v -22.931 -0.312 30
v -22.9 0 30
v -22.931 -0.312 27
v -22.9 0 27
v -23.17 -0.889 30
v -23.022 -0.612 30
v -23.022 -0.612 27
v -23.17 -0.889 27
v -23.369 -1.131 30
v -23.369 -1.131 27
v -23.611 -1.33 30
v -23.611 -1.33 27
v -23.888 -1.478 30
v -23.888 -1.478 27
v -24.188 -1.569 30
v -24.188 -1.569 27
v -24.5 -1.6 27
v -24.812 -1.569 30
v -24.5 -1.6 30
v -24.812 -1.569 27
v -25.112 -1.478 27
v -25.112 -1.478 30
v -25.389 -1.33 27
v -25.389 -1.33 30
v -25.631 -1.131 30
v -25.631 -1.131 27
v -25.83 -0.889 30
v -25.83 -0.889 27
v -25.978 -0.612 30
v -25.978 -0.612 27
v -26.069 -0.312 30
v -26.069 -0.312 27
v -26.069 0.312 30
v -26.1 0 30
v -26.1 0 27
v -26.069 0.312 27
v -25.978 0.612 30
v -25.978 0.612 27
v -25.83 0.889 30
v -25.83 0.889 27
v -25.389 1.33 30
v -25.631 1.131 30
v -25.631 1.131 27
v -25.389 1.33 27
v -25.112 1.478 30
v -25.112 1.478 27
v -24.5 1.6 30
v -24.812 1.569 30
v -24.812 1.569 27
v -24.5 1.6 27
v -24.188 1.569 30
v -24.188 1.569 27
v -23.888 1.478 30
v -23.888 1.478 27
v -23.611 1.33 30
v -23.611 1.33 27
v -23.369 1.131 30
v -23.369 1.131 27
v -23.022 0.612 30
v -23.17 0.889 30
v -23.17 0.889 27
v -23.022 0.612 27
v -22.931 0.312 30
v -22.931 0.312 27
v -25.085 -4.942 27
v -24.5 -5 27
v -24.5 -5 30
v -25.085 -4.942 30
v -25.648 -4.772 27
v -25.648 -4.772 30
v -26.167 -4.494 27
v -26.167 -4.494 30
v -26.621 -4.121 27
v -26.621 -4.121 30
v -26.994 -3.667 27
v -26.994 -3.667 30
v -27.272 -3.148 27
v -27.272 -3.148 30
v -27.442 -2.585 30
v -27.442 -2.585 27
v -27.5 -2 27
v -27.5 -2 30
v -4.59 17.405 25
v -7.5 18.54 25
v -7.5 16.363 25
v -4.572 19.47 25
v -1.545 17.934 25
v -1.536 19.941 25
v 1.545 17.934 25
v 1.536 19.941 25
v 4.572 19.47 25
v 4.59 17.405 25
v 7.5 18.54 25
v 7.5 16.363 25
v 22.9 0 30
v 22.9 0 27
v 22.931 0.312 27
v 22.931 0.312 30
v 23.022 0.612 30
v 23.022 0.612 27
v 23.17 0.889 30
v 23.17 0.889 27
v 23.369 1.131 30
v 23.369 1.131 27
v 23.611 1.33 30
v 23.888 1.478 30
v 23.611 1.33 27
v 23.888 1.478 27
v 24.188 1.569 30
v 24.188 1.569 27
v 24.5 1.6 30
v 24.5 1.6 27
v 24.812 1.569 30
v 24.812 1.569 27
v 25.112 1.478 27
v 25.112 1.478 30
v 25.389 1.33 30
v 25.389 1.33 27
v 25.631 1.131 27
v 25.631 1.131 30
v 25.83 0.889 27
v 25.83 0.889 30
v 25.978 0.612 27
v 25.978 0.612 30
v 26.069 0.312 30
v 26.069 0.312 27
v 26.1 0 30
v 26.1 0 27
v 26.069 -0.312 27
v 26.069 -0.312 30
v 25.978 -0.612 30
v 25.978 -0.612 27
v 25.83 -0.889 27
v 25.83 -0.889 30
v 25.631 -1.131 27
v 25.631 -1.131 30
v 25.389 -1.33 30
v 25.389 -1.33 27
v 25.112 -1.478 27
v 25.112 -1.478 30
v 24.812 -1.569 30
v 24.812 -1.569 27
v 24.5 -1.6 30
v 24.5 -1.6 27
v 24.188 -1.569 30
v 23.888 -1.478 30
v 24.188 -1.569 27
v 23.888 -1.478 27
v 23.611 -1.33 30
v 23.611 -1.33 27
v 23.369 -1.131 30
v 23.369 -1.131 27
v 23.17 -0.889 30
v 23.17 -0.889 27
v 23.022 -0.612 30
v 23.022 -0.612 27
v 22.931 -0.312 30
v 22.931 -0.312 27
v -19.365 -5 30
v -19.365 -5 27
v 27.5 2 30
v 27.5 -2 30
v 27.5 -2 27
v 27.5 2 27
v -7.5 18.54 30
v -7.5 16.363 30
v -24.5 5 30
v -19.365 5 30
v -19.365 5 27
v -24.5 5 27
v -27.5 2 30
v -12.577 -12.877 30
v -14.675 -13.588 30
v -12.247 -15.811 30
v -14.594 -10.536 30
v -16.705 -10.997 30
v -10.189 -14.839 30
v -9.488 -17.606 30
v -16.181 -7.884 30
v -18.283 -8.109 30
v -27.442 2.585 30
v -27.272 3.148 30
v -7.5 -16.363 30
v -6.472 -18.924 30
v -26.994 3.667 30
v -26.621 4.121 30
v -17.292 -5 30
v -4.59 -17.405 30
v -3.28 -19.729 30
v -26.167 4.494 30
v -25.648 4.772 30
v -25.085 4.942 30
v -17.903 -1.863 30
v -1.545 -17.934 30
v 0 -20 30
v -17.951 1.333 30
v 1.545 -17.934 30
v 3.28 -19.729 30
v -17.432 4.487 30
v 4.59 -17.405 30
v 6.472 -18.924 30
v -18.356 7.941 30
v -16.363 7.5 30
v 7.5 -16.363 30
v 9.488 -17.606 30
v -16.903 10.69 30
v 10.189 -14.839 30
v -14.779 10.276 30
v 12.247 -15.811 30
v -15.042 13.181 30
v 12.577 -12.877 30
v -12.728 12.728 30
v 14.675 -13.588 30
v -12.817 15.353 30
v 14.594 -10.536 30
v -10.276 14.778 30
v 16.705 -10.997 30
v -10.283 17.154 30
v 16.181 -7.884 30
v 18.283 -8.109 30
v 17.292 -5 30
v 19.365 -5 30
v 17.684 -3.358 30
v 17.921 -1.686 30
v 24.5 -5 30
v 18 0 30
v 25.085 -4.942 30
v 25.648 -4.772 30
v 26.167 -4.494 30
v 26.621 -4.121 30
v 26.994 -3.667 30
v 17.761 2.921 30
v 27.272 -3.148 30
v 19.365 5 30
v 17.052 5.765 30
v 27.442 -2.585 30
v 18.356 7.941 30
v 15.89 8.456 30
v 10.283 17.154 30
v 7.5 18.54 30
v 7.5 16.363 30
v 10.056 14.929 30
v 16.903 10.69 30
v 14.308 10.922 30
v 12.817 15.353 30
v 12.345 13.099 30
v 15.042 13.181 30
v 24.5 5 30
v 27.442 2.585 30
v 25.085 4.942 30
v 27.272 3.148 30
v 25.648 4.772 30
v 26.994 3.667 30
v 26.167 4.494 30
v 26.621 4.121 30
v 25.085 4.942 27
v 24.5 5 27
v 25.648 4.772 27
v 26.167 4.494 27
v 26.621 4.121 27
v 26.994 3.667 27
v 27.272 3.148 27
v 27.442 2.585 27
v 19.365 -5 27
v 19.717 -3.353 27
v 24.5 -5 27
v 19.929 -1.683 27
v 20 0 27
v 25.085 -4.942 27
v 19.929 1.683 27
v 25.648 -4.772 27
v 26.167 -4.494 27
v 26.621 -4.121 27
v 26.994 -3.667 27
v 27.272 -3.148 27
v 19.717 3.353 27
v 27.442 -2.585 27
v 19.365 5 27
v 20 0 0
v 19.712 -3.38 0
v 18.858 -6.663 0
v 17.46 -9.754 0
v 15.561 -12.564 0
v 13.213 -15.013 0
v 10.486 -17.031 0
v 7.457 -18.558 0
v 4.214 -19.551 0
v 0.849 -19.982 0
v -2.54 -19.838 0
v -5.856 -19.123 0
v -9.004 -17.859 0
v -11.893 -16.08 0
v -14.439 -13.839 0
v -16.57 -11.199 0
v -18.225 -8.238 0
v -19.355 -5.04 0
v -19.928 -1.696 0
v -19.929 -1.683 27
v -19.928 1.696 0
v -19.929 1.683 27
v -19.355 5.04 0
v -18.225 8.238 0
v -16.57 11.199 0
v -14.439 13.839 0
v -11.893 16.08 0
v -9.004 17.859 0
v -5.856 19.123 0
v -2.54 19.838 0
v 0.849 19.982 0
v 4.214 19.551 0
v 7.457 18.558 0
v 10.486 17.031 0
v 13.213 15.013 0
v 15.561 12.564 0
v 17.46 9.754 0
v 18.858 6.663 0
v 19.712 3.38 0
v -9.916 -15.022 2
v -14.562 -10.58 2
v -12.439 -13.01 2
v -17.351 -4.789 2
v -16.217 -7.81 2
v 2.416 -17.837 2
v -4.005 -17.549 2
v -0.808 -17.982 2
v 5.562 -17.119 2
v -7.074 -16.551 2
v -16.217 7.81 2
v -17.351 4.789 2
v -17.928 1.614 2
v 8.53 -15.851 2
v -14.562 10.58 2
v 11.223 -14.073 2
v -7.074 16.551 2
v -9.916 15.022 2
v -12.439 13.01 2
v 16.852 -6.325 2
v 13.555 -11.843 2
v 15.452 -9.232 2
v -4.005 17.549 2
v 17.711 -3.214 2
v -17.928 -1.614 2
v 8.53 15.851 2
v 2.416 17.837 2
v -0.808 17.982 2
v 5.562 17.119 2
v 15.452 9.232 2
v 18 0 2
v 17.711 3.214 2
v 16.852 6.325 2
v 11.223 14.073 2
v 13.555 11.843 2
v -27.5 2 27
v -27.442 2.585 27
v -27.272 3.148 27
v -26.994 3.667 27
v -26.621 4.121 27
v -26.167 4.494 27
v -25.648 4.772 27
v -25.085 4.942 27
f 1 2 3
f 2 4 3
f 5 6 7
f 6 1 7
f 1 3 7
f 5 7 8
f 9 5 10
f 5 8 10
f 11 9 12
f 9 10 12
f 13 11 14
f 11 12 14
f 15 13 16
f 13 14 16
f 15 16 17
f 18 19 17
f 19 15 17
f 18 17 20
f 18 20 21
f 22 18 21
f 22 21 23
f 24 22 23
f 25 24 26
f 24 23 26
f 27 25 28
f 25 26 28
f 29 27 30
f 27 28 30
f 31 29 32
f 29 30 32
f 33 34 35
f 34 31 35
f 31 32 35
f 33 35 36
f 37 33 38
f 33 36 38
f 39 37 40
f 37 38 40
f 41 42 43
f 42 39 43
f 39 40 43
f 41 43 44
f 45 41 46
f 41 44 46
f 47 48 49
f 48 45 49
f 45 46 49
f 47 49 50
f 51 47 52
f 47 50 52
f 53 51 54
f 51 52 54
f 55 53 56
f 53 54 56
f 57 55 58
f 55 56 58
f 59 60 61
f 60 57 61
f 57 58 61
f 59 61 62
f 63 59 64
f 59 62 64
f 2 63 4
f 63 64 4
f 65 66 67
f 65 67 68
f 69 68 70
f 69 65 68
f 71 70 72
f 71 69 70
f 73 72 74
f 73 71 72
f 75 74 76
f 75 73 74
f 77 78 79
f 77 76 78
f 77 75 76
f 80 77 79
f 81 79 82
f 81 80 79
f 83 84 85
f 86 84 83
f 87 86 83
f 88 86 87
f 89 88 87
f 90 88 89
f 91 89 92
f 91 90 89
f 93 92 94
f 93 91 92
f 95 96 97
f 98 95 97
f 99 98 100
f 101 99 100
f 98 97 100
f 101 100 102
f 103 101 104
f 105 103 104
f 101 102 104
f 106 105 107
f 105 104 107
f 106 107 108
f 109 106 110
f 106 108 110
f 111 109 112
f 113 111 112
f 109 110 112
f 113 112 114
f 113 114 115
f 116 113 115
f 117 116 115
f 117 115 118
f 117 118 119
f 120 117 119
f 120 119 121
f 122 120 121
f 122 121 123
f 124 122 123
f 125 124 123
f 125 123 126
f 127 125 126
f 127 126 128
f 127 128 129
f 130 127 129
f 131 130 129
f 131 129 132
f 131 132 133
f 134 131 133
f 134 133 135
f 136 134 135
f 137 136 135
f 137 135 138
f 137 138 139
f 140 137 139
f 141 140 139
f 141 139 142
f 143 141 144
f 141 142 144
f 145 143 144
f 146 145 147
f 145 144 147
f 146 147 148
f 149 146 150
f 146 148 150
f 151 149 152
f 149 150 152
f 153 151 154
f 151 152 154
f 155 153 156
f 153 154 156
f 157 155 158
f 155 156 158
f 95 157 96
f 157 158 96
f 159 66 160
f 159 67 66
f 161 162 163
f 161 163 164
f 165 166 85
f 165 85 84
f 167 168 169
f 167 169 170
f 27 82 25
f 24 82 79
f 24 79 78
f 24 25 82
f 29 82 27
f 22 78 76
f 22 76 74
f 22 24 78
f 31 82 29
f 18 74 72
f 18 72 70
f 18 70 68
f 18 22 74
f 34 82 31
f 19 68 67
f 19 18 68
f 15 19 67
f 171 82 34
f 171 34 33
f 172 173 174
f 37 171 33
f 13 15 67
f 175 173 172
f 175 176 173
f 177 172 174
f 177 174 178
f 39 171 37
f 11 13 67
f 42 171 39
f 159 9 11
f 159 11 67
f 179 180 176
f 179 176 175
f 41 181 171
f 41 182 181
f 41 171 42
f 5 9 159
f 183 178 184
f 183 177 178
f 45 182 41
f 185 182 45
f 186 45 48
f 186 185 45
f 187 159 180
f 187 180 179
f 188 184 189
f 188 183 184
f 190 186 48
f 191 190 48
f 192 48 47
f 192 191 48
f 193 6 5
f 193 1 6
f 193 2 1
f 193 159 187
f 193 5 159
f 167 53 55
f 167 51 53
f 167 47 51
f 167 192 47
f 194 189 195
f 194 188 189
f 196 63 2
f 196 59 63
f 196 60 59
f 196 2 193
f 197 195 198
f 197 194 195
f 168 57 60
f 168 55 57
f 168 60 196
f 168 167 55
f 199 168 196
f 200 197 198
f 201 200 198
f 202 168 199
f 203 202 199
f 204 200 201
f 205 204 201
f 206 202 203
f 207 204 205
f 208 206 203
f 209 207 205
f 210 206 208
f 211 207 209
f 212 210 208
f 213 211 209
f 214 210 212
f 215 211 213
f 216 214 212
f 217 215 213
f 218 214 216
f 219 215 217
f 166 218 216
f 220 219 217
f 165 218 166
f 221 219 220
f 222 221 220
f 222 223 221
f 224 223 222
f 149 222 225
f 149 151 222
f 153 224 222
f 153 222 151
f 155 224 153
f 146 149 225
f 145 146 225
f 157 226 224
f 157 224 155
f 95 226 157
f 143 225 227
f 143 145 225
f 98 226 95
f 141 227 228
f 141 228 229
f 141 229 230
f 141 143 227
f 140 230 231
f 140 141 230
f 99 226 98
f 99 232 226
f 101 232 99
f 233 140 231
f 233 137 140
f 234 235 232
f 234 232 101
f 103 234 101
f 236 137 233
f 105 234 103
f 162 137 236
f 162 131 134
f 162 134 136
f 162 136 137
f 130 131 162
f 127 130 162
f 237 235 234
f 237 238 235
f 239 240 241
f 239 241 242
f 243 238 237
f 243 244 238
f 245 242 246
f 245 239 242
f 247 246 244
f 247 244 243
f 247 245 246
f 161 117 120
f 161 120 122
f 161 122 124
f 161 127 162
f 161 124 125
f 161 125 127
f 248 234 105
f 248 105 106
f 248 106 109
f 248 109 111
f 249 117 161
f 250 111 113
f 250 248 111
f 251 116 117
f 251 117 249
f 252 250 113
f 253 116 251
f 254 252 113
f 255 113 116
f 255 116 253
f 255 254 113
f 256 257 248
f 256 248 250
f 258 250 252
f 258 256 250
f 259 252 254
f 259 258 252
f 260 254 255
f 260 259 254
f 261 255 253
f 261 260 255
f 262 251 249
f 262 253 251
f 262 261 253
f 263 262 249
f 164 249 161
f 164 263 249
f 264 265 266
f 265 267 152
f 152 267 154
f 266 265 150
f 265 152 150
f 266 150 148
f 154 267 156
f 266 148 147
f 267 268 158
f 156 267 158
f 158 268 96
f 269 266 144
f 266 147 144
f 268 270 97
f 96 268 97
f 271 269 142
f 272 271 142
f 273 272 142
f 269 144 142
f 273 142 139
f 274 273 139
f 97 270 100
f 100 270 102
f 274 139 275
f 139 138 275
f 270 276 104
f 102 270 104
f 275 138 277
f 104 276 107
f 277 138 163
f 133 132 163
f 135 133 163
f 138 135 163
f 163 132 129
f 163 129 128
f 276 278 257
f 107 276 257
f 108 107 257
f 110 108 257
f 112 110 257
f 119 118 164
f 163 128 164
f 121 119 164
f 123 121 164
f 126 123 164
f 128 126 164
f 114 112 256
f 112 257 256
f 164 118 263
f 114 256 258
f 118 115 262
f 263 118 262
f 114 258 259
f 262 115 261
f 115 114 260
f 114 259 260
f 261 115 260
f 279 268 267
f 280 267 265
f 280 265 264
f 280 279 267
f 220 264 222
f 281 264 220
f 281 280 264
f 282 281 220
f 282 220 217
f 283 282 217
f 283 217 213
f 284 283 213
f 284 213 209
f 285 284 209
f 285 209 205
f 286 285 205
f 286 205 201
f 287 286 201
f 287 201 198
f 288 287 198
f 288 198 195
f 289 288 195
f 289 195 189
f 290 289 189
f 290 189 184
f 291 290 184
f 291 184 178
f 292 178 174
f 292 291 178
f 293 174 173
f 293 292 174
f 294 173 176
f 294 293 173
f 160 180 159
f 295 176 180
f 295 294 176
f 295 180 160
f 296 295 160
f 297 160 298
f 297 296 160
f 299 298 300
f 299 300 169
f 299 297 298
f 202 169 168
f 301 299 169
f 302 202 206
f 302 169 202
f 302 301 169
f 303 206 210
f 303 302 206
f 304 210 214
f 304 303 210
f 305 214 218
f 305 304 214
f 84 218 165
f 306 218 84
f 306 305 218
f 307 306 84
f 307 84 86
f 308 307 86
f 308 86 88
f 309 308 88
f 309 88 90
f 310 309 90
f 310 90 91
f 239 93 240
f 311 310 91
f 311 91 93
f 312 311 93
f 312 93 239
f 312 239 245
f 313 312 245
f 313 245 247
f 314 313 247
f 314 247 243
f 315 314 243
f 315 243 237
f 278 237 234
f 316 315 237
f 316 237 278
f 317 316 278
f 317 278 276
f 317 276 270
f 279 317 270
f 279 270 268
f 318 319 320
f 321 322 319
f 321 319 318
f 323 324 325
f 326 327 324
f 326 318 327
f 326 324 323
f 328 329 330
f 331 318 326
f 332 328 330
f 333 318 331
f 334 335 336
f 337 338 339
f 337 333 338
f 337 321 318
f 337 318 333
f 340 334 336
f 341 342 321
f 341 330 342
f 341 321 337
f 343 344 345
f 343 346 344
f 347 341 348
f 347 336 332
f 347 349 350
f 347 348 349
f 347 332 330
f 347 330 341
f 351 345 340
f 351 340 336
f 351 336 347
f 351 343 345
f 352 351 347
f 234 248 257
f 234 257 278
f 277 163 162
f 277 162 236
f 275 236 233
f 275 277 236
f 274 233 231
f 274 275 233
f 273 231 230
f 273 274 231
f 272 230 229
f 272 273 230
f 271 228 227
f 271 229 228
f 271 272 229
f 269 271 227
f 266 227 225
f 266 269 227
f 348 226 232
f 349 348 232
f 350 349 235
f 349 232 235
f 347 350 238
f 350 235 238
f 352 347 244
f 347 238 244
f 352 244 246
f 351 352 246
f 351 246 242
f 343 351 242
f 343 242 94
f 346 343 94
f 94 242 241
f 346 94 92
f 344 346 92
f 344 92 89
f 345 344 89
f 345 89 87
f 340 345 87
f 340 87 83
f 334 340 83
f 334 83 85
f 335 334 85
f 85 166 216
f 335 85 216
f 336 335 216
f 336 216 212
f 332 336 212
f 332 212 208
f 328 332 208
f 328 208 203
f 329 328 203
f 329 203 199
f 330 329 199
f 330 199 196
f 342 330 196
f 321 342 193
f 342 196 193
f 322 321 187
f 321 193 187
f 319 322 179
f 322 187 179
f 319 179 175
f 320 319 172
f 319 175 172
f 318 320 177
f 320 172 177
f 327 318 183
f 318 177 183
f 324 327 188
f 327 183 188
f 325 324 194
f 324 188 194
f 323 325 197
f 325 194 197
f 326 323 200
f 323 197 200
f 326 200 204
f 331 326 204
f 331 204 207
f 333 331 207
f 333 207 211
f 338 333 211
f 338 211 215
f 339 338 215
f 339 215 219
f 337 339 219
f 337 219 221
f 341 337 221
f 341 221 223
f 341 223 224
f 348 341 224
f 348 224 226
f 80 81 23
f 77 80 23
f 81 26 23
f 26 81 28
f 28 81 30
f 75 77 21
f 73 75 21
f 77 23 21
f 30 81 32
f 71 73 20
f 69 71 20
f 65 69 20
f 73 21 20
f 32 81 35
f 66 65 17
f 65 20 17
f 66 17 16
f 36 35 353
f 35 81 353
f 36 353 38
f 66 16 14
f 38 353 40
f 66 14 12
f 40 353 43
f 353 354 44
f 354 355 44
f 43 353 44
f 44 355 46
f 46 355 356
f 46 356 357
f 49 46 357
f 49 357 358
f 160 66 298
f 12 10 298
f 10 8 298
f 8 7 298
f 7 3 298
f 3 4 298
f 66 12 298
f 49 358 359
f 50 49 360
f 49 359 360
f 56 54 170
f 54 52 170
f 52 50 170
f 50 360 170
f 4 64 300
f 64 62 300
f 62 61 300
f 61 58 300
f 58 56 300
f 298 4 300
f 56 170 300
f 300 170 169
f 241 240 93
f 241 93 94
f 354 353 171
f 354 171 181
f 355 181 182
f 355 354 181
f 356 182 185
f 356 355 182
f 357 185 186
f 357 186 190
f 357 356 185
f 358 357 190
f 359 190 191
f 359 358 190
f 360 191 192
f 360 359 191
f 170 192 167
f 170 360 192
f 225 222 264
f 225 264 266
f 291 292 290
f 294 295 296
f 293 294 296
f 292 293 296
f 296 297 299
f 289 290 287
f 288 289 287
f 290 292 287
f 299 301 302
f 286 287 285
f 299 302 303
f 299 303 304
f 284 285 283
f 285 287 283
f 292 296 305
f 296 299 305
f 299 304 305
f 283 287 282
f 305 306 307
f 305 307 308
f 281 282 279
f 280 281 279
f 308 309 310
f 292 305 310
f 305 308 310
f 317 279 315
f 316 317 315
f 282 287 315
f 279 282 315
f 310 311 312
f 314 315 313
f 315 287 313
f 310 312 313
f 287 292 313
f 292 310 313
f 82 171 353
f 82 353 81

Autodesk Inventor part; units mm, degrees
ref_plane "YZ Plane" through (0, 0, 0) normal (1, 0, 0) x (0, 1, 0)
ref_plane "XZ Plane" through (0, 0, 0) normal (0, 1, 0) x (-1, 0, 0)
ref_plane "XY Plane" through (0, 0, 0) normal (0, 0, 1) x (1, 0, 0)
sketch "草圖1" plane through (0, 0, 0) normal (0, 0, 1) x (1, 0, 0)
  circle A0 centre (0, 0) radius 20
  dimension "d0" = 40
extrude "擠出1" add sketch "草圖1" along normal blind 30
sketch "草圖2" plane through (0, 0, 30) normal (0, 0, 1) x (1, 0, 0)
  circle A0 centre (0, 0) radius 18
  circle A1 centre (0, 0) radius 20 projected
  dimension "d3" = 2
extrude "擠出2" cut sketch "草圖2" against normal blind 28 contours A0
sketch "草圖3" plane through (0, 0, 30) normal (0, 0, 1) x (1, 0, 0)
  line L0 (-7.5, 20) -> (7.5, 20)
  line L1 (7.5, 20) -> (7.5, 10)
  line L2 (7.5, 10) -> (-7.5, 10)
  line L3 (-7.5, 10) -> (-7.5, 20)
  circle A0 centre (0, 0) radius 20 projected
  point P0 (0, 20)
  dimension "d6" = 15
  dimension "d7" = 10
extrude "擠出3" cut sketch "草圖3" against normal blind 5 contours L0 A0 L3 | L0 L1 A0 | A0 L1 L2 L3 picked at (0, 13.3333)
sketch "草圖4" plane through (0, 0, 30) normal (0, 0, 1) x (1, 0, 0)
  line L0 (-27.5, -5) -> (27.5, -5)
  line L1 (27.5, -5) -> (27.5, 5)
  line L2 (27.5, 5) -> (-27.5, 5)
  line L3 (-27.5, 5) -> (-27.5, -5)
  point P0 (0, 0)
  point P1 (0, -5)
  point P2 (-27.5, 0)
  dimension "d10" = 10
  dimension "d11" = 55
extrude "擠出4" add sketch "草圖4" against normal blind 3
sketch "草圖5" plane through (0, 0, 30) normal (0, 0, 1) x (1, 0, 0)
  circle A0 centre (0, 0) radius 18
  arc A1 (-17.2916, -5) -> (17.2916, -5) centre (0, 0) ccw projected
  dimension "d14" = 0
extrude "擠出5" cut sketch "草圖5" against normal up to surface (28 mm away)
sketch "草圖6" plane through (0, 0, 27) normal (0, 0, -1) x (-1, 0, 0)
  circle A0 centre (-24.5, 0) radius 1.6
  line L0 (-27.5, 5) -> (-27.5, -5) projected
  point P0 (0, 0)
  dimension "d17" = 3.2
  dimension "d18" = 3
extrude "擠出6" cut sketch "草圖6" against normal up to surface (3 mm away)
mirror "鏡射1" about plane through (0, 0, 0) normal (1, 0, 0) of "擠出6"
fillet "圓角1" radius 3 4 edges at (27.5, 5, 28.5) (27.5, -5, 28.5) (-27.5, 5, 28.5) (-27.5, -5, 28.5)
properties part number "音箱"
